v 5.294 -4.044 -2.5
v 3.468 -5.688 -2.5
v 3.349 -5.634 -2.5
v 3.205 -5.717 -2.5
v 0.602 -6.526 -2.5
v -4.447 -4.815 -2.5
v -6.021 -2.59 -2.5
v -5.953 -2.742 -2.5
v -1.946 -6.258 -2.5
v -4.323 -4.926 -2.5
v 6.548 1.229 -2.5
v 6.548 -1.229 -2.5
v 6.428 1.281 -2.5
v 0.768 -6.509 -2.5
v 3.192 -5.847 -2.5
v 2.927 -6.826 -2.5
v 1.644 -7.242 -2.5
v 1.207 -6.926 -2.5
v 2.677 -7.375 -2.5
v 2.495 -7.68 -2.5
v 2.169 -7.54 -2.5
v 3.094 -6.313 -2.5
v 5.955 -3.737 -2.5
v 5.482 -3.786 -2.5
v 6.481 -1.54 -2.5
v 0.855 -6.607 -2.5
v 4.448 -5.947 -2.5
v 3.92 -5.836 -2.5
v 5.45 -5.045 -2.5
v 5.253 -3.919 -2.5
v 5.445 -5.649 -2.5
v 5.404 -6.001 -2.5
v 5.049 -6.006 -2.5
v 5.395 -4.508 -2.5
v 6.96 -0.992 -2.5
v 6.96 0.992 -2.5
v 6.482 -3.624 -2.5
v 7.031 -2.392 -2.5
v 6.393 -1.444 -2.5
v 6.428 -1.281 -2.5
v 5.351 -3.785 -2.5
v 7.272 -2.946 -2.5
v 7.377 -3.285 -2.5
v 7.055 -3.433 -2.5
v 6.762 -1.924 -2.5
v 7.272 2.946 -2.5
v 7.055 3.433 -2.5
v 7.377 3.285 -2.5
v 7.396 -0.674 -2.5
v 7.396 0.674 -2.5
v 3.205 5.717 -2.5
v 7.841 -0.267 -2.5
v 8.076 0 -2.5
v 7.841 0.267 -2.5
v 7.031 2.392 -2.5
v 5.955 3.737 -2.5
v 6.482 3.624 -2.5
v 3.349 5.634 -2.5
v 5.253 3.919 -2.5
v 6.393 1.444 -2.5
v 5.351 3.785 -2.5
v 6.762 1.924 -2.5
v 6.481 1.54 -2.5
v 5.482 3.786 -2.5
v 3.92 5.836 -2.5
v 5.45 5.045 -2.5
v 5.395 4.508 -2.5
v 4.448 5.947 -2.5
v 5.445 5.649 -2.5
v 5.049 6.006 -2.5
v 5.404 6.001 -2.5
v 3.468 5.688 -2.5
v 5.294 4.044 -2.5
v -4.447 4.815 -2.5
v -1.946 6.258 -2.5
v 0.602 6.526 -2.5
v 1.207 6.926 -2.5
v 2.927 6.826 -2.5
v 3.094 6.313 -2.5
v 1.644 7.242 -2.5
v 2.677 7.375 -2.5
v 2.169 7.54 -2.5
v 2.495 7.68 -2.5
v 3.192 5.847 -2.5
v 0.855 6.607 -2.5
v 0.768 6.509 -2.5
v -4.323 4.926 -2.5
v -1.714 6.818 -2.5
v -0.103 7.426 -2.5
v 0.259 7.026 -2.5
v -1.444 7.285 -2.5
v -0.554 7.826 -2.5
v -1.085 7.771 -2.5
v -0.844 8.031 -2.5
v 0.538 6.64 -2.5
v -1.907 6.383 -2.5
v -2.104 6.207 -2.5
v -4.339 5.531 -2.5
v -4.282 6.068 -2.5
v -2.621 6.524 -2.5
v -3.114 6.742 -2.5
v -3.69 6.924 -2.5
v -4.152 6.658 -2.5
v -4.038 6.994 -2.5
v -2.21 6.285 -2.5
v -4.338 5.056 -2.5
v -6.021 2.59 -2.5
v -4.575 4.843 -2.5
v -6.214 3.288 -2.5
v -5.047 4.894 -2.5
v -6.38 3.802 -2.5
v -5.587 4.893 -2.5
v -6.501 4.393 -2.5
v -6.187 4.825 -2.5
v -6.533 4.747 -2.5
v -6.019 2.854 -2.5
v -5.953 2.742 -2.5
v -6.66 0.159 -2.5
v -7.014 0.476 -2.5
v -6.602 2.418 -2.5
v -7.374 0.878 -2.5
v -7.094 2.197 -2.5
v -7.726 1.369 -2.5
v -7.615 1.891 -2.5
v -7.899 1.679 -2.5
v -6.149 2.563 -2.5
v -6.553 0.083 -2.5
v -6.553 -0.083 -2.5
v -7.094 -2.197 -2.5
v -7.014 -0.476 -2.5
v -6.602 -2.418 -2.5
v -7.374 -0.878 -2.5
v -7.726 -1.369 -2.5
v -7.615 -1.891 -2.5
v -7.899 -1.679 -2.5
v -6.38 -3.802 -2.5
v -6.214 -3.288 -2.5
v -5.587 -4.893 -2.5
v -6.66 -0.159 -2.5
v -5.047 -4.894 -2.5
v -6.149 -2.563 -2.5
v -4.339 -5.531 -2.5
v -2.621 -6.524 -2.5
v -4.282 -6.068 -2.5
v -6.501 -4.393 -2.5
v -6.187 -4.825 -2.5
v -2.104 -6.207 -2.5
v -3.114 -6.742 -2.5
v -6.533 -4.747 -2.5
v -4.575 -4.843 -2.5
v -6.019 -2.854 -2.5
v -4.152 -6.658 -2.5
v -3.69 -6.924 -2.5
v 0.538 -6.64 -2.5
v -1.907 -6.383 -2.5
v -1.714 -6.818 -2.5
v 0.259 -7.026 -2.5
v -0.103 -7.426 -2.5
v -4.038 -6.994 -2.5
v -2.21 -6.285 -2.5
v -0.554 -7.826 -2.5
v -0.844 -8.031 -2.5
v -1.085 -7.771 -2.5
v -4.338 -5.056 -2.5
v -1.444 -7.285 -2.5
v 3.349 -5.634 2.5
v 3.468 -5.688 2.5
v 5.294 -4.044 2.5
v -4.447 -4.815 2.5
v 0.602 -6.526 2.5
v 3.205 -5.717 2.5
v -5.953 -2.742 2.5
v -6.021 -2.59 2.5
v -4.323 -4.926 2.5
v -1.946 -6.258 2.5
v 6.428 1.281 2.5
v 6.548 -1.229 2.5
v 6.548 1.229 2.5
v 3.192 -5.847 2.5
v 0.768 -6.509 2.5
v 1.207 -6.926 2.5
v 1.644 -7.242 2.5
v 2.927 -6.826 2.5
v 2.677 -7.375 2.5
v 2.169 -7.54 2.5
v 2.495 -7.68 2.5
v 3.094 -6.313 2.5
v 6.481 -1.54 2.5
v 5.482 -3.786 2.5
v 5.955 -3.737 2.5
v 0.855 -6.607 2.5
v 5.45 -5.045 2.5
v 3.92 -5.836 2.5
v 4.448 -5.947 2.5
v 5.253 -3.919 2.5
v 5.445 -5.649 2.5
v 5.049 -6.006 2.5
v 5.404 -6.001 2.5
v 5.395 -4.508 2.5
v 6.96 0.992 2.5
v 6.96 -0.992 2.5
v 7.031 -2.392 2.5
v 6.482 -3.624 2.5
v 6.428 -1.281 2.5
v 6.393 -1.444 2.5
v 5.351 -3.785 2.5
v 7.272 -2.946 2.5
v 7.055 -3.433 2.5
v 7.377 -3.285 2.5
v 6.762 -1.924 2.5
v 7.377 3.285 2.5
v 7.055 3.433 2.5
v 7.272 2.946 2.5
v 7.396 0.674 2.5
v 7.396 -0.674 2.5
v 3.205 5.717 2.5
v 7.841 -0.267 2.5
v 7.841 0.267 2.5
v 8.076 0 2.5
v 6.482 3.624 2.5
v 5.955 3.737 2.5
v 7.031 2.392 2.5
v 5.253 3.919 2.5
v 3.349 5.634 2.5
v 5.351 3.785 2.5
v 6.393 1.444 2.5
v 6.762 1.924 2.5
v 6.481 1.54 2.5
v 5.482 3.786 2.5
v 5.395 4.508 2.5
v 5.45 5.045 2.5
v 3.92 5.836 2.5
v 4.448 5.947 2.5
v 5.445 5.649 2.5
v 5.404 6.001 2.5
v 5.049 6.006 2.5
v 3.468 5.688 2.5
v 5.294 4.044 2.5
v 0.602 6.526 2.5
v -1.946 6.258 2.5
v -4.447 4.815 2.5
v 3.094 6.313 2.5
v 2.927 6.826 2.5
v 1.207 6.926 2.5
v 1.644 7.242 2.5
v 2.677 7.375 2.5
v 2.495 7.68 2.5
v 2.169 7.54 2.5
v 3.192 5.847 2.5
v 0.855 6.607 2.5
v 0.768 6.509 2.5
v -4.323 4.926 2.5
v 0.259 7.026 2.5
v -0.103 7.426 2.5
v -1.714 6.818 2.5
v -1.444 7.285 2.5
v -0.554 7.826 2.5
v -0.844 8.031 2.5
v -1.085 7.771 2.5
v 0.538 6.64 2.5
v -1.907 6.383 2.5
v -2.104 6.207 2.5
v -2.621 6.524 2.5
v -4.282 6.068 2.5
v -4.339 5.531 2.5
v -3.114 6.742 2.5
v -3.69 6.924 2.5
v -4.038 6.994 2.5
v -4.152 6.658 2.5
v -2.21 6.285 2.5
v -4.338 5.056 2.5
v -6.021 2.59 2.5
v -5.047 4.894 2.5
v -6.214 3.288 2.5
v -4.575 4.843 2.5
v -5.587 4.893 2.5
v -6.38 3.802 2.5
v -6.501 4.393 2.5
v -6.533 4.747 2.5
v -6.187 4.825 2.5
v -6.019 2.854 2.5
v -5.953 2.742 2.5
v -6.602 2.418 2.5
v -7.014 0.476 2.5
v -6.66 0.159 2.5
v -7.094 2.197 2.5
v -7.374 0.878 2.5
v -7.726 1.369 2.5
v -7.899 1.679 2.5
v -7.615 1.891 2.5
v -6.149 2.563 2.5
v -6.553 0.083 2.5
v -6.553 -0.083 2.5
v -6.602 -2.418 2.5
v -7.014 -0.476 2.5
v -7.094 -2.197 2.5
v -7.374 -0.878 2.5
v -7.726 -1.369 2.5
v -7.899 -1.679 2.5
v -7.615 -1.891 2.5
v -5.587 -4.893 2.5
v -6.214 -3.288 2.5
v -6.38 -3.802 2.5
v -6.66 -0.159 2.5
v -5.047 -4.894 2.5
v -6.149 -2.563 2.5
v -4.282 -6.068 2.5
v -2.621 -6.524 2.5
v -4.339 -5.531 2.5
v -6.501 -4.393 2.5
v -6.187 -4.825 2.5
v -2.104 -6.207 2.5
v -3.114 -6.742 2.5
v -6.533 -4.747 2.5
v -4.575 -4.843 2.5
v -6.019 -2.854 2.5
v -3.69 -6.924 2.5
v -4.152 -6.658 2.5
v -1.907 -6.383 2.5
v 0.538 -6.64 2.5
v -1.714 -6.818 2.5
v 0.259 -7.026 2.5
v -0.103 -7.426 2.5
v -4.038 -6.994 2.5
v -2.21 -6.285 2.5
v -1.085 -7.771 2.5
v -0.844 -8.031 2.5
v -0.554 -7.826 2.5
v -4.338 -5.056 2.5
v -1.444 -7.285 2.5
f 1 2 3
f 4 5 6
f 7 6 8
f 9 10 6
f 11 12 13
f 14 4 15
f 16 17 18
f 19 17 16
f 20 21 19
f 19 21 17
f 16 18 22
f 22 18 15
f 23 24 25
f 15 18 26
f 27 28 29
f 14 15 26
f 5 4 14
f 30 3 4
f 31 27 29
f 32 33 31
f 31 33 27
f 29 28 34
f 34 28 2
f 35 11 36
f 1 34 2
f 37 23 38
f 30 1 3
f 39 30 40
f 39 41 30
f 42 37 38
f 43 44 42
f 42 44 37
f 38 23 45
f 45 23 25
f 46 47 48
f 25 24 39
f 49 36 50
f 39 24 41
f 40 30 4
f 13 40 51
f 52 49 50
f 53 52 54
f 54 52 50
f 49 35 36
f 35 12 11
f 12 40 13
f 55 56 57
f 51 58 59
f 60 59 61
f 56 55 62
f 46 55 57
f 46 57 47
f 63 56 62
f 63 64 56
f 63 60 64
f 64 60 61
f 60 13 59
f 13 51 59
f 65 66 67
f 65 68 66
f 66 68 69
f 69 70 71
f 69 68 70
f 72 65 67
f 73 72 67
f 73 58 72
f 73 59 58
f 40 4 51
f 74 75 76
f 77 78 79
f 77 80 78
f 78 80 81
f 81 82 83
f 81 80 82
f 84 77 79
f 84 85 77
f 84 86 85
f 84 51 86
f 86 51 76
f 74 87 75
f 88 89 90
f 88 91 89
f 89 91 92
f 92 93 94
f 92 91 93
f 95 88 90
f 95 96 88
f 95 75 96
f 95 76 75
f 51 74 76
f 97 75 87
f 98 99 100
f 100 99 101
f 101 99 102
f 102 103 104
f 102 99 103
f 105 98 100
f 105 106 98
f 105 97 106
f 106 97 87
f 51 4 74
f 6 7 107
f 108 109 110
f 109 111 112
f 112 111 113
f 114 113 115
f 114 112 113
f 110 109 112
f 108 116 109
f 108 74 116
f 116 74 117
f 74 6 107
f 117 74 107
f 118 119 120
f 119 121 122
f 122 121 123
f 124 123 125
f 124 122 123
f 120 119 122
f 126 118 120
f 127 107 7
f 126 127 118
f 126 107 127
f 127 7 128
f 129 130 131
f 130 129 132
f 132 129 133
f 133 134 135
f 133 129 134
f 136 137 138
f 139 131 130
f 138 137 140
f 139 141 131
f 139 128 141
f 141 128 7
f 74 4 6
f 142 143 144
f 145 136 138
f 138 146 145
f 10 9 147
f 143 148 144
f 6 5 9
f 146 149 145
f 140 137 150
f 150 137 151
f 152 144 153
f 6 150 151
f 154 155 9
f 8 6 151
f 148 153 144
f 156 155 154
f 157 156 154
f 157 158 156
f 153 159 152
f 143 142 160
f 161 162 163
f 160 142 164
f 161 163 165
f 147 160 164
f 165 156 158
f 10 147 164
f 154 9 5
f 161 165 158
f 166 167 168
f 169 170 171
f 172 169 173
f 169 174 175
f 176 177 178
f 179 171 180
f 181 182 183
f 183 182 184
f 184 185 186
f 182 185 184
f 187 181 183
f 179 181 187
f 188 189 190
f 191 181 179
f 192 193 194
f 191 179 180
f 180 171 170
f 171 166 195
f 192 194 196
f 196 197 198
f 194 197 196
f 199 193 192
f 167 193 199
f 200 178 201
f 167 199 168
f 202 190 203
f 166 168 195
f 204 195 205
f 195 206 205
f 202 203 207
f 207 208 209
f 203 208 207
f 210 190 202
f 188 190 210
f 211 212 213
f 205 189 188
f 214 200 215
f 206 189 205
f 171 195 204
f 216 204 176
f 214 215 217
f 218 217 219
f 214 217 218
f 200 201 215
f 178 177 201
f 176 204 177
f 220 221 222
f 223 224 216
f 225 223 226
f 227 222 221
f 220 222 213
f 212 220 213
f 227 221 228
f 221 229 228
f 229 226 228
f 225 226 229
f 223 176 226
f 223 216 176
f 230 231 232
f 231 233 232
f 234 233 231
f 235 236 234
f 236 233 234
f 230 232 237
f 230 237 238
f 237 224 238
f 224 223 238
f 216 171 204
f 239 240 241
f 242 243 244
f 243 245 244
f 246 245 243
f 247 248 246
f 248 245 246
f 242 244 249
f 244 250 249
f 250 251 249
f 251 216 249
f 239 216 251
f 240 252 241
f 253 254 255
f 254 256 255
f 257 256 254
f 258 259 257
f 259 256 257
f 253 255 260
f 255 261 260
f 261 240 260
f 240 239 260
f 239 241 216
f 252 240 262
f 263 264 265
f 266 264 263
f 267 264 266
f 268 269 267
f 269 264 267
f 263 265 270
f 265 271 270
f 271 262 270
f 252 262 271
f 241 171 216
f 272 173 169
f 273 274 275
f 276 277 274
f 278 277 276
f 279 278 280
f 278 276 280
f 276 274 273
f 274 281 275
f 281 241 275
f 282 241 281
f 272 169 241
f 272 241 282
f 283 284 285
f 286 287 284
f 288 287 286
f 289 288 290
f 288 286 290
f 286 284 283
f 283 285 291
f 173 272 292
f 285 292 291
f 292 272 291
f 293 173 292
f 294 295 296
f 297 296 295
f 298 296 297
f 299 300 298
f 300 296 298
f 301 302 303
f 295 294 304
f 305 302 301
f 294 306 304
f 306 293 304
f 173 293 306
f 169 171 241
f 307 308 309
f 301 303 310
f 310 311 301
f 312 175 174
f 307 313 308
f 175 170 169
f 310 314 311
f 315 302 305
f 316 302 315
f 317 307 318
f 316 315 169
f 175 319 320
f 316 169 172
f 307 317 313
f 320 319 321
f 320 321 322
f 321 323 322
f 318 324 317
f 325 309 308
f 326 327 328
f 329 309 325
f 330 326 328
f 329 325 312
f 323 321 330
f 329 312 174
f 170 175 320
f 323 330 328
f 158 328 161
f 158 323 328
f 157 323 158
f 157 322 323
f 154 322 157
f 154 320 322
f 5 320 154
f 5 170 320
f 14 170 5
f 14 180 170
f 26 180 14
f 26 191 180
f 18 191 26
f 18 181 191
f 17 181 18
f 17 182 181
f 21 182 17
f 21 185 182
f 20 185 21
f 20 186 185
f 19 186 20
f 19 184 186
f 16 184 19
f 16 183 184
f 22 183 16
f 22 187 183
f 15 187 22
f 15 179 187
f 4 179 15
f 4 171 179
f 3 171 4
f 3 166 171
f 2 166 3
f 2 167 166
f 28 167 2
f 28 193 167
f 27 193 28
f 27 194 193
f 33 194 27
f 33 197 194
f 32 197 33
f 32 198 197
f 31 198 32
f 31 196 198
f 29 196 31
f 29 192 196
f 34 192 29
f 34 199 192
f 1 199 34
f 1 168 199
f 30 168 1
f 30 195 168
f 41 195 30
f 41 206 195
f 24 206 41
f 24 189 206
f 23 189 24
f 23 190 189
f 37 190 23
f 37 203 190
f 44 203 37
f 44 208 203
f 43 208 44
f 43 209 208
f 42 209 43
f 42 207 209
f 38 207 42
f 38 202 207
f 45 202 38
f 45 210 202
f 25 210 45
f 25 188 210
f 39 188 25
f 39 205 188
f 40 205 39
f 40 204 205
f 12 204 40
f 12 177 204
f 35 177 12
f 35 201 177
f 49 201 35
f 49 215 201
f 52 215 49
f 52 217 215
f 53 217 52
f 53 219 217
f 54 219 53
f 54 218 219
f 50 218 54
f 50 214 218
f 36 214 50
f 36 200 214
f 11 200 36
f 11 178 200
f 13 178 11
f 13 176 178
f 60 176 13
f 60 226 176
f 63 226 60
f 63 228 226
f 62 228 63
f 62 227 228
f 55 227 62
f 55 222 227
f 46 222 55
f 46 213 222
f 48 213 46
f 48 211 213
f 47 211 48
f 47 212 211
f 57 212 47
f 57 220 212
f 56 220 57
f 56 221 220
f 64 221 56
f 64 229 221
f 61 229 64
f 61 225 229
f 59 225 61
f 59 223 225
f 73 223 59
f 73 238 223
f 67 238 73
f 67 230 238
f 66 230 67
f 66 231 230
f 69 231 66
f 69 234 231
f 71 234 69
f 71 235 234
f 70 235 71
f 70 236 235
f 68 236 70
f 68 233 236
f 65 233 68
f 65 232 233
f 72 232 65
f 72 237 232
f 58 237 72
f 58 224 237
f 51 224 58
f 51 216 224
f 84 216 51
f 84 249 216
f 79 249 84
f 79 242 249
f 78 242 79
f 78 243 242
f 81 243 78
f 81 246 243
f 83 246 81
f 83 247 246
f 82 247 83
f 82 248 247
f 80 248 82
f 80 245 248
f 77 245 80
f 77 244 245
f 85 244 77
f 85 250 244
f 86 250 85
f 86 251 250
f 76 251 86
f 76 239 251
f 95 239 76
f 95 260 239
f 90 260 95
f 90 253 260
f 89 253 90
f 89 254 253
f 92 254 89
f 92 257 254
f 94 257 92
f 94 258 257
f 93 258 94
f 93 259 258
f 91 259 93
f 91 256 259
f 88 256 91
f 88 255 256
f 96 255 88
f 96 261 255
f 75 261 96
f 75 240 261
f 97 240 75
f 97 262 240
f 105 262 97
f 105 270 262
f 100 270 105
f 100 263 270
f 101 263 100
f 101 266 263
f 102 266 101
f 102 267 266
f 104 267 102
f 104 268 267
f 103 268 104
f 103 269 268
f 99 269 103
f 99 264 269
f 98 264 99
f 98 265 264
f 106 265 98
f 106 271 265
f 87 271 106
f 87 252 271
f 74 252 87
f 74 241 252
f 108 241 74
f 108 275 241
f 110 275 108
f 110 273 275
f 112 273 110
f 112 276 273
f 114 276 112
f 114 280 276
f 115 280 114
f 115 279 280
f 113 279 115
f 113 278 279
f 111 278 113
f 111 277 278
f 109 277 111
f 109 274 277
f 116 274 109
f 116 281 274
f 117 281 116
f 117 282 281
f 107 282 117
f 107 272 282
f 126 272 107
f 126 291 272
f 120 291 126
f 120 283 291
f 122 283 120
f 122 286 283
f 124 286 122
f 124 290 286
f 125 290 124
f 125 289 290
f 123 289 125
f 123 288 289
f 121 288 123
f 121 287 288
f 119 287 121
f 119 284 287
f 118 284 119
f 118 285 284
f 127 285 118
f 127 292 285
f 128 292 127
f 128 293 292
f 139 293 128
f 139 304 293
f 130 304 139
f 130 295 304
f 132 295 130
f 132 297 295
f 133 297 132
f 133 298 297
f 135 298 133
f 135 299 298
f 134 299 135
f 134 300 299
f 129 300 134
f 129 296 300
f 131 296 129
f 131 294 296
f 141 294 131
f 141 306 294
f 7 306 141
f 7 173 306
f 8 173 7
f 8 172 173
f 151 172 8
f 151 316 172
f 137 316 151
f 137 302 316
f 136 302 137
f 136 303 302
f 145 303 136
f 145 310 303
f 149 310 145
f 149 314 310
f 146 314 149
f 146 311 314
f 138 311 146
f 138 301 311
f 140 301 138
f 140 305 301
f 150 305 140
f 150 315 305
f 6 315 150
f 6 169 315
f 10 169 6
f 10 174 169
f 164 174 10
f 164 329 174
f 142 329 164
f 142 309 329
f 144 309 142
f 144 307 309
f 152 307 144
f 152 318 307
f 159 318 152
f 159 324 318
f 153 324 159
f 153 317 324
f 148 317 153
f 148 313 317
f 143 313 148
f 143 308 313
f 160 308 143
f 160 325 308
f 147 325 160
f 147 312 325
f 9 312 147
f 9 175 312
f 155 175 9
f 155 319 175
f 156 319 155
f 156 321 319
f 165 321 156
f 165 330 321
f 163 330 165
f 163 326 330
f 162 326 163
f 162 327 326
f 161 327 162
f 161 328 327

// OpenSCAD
gear(
	number_of_teeth=15,
 	modulus=1,
	pressure_angle=45,
	depth_ratio=.5,
	clearance=.25,
	h=5,
	center=true);

function gear_outer_radius(number_of_teeth,
	modulus,
	depth_ratio,
	clearance) = (number_of_teeth*modulus/2)+depth_ratio*(modulus*PI)/2-clearance/2;

function gear_pitch_radius(number_of_teeth, modulus) = number_of_teeth*modulus/2;

module gear (
	number_of_teeth,
	modulus,
	pressure_angle,
	depth_ratio,
	clearance,
	h,
	center=false)
{
	linear_extrude(height=h, center=center, convexity=4)
	{
		gear2D(number_of_teeth, modulus, pressure_angle, depth_ratio, clearance);
	}
}

module gear2D (
	number_of_teeth,
	modulus,
	pressure_angle,
	depth_ratio,
	clearance)
{
	circular_pitch = modulus*PI;
	pitch_radius = gear_pitch_radius(number_of_teeth, modulus);
	base_radius = pitch_radius*cos(pressure_angle);
	depth=circular_pitch/(2*tan(pressure_angle));
	outer_radius = clearance<0 ? pitch_radius+depth/2-clearance : pitch_radius+depth/2;
	root_radius1 = pitch_radius-depth/2-clearance/2;
	root_radius = (clearance<0 && root_radius1<base_radius) ? base_radius : root_radius1;
	backlash_angle = clearance/(pitch_radius*cos(pressure_angle)) * 180 / PI;
	half_thick_angle = 90/number_of_teeth - backlash_angle/2;
	pitch_point = involute (base_radius, involute_intersect_angle (base_radius, pitch_radius));
	pitch_angle = atan2 (pitch_point[1], pitch_point[0]);
	min_radius = max (base_radius,root_radius);

	*echo("circular_pitch = ", circular_pitch,
		"pitch_radius = ", pitch_radius,
		"base_radius = ", base_radius,
		"depth = ", depth,
		"outer_radius = ", outer_radius);

	intersection()
	{
		rotate(90/number_of_teeth)
			circle($fn=number_of_teeth*3,r=pitch_radius+depth_ratio*circular_pitch/2-clearance/2);
		union()
		{
			rotate(90/number_of_teeth)
				circle($fn=number_of_teeth*2,r=max(root_radius,pitch_radius-depth_ratio*circular_pitch/2-clearance/2));
			for (i = [1:number_of_teeth])rotate(i*360/number_of_teeth)
			{
				halftooth (
					pitch_angle,
					base_radius,
					min_radius,
					outer_radius,
					half_thick_angle);		
				mirror([0,1]) halftooth (
					pitch_angle,
					base_radius,
					min_radius,
					outer_radius,
					half_thick_angle);
			}
		}
	}
}

module halftooth (
	pitch_angle,
	base_radius,
	min_radius,
	outer_radius,
	half_thick_angle)
{
	index=[0,1,2,3,4,5];
	start_angle = max(involute_intersect_angle (base_radius, min_radius)-5,0);
	stop_angle = involute_intersect_angle (base_radius, outer_radius);
	angle=index*(stop_angle-start_angle)/index[len(index)-1];
	p=[[0,0],
	involute(base_radius,angle[0]+start_angle),
	involute(base_radius,angle[1]+start_angle),
	involute(base_radius,angle[2]+start_angle),
	involute(base_radius,angle[3]+start_angle),
	involute(base_radius,angle[4]+start_angle),
	involute(base_radius,angle[5]+start_angle)];

	difference()	
	{
		rotate(-pitch_angle-half_thick_angle)polygon(points=p);
		square(2*outer_radius);
	}
}

// Mathematical Functions
//===============

// Finds the angle of the involute about the base radius at the given distance (radius) from it's center.
//source: http://www.mathhelpforum.com/math-help/geometry/136011-circle-involute-solving-y-any-given-x.html

function involute_intersect_angle (base_radius, radius) = sqrt (pow (radius/base_radius, 2) - 1) * 180 / PI;

// Calculate the involute position for a given base radius and involute angle.

function involute (base_radius, involute_angle) =
[
	base_radius*(cos (involute_angle) + involute_angle*PI/180*sin (involute_angle)),
	base_radius*(sin (involute_angle) - involute_angle*PI/180*cos (involute_angle))
];
